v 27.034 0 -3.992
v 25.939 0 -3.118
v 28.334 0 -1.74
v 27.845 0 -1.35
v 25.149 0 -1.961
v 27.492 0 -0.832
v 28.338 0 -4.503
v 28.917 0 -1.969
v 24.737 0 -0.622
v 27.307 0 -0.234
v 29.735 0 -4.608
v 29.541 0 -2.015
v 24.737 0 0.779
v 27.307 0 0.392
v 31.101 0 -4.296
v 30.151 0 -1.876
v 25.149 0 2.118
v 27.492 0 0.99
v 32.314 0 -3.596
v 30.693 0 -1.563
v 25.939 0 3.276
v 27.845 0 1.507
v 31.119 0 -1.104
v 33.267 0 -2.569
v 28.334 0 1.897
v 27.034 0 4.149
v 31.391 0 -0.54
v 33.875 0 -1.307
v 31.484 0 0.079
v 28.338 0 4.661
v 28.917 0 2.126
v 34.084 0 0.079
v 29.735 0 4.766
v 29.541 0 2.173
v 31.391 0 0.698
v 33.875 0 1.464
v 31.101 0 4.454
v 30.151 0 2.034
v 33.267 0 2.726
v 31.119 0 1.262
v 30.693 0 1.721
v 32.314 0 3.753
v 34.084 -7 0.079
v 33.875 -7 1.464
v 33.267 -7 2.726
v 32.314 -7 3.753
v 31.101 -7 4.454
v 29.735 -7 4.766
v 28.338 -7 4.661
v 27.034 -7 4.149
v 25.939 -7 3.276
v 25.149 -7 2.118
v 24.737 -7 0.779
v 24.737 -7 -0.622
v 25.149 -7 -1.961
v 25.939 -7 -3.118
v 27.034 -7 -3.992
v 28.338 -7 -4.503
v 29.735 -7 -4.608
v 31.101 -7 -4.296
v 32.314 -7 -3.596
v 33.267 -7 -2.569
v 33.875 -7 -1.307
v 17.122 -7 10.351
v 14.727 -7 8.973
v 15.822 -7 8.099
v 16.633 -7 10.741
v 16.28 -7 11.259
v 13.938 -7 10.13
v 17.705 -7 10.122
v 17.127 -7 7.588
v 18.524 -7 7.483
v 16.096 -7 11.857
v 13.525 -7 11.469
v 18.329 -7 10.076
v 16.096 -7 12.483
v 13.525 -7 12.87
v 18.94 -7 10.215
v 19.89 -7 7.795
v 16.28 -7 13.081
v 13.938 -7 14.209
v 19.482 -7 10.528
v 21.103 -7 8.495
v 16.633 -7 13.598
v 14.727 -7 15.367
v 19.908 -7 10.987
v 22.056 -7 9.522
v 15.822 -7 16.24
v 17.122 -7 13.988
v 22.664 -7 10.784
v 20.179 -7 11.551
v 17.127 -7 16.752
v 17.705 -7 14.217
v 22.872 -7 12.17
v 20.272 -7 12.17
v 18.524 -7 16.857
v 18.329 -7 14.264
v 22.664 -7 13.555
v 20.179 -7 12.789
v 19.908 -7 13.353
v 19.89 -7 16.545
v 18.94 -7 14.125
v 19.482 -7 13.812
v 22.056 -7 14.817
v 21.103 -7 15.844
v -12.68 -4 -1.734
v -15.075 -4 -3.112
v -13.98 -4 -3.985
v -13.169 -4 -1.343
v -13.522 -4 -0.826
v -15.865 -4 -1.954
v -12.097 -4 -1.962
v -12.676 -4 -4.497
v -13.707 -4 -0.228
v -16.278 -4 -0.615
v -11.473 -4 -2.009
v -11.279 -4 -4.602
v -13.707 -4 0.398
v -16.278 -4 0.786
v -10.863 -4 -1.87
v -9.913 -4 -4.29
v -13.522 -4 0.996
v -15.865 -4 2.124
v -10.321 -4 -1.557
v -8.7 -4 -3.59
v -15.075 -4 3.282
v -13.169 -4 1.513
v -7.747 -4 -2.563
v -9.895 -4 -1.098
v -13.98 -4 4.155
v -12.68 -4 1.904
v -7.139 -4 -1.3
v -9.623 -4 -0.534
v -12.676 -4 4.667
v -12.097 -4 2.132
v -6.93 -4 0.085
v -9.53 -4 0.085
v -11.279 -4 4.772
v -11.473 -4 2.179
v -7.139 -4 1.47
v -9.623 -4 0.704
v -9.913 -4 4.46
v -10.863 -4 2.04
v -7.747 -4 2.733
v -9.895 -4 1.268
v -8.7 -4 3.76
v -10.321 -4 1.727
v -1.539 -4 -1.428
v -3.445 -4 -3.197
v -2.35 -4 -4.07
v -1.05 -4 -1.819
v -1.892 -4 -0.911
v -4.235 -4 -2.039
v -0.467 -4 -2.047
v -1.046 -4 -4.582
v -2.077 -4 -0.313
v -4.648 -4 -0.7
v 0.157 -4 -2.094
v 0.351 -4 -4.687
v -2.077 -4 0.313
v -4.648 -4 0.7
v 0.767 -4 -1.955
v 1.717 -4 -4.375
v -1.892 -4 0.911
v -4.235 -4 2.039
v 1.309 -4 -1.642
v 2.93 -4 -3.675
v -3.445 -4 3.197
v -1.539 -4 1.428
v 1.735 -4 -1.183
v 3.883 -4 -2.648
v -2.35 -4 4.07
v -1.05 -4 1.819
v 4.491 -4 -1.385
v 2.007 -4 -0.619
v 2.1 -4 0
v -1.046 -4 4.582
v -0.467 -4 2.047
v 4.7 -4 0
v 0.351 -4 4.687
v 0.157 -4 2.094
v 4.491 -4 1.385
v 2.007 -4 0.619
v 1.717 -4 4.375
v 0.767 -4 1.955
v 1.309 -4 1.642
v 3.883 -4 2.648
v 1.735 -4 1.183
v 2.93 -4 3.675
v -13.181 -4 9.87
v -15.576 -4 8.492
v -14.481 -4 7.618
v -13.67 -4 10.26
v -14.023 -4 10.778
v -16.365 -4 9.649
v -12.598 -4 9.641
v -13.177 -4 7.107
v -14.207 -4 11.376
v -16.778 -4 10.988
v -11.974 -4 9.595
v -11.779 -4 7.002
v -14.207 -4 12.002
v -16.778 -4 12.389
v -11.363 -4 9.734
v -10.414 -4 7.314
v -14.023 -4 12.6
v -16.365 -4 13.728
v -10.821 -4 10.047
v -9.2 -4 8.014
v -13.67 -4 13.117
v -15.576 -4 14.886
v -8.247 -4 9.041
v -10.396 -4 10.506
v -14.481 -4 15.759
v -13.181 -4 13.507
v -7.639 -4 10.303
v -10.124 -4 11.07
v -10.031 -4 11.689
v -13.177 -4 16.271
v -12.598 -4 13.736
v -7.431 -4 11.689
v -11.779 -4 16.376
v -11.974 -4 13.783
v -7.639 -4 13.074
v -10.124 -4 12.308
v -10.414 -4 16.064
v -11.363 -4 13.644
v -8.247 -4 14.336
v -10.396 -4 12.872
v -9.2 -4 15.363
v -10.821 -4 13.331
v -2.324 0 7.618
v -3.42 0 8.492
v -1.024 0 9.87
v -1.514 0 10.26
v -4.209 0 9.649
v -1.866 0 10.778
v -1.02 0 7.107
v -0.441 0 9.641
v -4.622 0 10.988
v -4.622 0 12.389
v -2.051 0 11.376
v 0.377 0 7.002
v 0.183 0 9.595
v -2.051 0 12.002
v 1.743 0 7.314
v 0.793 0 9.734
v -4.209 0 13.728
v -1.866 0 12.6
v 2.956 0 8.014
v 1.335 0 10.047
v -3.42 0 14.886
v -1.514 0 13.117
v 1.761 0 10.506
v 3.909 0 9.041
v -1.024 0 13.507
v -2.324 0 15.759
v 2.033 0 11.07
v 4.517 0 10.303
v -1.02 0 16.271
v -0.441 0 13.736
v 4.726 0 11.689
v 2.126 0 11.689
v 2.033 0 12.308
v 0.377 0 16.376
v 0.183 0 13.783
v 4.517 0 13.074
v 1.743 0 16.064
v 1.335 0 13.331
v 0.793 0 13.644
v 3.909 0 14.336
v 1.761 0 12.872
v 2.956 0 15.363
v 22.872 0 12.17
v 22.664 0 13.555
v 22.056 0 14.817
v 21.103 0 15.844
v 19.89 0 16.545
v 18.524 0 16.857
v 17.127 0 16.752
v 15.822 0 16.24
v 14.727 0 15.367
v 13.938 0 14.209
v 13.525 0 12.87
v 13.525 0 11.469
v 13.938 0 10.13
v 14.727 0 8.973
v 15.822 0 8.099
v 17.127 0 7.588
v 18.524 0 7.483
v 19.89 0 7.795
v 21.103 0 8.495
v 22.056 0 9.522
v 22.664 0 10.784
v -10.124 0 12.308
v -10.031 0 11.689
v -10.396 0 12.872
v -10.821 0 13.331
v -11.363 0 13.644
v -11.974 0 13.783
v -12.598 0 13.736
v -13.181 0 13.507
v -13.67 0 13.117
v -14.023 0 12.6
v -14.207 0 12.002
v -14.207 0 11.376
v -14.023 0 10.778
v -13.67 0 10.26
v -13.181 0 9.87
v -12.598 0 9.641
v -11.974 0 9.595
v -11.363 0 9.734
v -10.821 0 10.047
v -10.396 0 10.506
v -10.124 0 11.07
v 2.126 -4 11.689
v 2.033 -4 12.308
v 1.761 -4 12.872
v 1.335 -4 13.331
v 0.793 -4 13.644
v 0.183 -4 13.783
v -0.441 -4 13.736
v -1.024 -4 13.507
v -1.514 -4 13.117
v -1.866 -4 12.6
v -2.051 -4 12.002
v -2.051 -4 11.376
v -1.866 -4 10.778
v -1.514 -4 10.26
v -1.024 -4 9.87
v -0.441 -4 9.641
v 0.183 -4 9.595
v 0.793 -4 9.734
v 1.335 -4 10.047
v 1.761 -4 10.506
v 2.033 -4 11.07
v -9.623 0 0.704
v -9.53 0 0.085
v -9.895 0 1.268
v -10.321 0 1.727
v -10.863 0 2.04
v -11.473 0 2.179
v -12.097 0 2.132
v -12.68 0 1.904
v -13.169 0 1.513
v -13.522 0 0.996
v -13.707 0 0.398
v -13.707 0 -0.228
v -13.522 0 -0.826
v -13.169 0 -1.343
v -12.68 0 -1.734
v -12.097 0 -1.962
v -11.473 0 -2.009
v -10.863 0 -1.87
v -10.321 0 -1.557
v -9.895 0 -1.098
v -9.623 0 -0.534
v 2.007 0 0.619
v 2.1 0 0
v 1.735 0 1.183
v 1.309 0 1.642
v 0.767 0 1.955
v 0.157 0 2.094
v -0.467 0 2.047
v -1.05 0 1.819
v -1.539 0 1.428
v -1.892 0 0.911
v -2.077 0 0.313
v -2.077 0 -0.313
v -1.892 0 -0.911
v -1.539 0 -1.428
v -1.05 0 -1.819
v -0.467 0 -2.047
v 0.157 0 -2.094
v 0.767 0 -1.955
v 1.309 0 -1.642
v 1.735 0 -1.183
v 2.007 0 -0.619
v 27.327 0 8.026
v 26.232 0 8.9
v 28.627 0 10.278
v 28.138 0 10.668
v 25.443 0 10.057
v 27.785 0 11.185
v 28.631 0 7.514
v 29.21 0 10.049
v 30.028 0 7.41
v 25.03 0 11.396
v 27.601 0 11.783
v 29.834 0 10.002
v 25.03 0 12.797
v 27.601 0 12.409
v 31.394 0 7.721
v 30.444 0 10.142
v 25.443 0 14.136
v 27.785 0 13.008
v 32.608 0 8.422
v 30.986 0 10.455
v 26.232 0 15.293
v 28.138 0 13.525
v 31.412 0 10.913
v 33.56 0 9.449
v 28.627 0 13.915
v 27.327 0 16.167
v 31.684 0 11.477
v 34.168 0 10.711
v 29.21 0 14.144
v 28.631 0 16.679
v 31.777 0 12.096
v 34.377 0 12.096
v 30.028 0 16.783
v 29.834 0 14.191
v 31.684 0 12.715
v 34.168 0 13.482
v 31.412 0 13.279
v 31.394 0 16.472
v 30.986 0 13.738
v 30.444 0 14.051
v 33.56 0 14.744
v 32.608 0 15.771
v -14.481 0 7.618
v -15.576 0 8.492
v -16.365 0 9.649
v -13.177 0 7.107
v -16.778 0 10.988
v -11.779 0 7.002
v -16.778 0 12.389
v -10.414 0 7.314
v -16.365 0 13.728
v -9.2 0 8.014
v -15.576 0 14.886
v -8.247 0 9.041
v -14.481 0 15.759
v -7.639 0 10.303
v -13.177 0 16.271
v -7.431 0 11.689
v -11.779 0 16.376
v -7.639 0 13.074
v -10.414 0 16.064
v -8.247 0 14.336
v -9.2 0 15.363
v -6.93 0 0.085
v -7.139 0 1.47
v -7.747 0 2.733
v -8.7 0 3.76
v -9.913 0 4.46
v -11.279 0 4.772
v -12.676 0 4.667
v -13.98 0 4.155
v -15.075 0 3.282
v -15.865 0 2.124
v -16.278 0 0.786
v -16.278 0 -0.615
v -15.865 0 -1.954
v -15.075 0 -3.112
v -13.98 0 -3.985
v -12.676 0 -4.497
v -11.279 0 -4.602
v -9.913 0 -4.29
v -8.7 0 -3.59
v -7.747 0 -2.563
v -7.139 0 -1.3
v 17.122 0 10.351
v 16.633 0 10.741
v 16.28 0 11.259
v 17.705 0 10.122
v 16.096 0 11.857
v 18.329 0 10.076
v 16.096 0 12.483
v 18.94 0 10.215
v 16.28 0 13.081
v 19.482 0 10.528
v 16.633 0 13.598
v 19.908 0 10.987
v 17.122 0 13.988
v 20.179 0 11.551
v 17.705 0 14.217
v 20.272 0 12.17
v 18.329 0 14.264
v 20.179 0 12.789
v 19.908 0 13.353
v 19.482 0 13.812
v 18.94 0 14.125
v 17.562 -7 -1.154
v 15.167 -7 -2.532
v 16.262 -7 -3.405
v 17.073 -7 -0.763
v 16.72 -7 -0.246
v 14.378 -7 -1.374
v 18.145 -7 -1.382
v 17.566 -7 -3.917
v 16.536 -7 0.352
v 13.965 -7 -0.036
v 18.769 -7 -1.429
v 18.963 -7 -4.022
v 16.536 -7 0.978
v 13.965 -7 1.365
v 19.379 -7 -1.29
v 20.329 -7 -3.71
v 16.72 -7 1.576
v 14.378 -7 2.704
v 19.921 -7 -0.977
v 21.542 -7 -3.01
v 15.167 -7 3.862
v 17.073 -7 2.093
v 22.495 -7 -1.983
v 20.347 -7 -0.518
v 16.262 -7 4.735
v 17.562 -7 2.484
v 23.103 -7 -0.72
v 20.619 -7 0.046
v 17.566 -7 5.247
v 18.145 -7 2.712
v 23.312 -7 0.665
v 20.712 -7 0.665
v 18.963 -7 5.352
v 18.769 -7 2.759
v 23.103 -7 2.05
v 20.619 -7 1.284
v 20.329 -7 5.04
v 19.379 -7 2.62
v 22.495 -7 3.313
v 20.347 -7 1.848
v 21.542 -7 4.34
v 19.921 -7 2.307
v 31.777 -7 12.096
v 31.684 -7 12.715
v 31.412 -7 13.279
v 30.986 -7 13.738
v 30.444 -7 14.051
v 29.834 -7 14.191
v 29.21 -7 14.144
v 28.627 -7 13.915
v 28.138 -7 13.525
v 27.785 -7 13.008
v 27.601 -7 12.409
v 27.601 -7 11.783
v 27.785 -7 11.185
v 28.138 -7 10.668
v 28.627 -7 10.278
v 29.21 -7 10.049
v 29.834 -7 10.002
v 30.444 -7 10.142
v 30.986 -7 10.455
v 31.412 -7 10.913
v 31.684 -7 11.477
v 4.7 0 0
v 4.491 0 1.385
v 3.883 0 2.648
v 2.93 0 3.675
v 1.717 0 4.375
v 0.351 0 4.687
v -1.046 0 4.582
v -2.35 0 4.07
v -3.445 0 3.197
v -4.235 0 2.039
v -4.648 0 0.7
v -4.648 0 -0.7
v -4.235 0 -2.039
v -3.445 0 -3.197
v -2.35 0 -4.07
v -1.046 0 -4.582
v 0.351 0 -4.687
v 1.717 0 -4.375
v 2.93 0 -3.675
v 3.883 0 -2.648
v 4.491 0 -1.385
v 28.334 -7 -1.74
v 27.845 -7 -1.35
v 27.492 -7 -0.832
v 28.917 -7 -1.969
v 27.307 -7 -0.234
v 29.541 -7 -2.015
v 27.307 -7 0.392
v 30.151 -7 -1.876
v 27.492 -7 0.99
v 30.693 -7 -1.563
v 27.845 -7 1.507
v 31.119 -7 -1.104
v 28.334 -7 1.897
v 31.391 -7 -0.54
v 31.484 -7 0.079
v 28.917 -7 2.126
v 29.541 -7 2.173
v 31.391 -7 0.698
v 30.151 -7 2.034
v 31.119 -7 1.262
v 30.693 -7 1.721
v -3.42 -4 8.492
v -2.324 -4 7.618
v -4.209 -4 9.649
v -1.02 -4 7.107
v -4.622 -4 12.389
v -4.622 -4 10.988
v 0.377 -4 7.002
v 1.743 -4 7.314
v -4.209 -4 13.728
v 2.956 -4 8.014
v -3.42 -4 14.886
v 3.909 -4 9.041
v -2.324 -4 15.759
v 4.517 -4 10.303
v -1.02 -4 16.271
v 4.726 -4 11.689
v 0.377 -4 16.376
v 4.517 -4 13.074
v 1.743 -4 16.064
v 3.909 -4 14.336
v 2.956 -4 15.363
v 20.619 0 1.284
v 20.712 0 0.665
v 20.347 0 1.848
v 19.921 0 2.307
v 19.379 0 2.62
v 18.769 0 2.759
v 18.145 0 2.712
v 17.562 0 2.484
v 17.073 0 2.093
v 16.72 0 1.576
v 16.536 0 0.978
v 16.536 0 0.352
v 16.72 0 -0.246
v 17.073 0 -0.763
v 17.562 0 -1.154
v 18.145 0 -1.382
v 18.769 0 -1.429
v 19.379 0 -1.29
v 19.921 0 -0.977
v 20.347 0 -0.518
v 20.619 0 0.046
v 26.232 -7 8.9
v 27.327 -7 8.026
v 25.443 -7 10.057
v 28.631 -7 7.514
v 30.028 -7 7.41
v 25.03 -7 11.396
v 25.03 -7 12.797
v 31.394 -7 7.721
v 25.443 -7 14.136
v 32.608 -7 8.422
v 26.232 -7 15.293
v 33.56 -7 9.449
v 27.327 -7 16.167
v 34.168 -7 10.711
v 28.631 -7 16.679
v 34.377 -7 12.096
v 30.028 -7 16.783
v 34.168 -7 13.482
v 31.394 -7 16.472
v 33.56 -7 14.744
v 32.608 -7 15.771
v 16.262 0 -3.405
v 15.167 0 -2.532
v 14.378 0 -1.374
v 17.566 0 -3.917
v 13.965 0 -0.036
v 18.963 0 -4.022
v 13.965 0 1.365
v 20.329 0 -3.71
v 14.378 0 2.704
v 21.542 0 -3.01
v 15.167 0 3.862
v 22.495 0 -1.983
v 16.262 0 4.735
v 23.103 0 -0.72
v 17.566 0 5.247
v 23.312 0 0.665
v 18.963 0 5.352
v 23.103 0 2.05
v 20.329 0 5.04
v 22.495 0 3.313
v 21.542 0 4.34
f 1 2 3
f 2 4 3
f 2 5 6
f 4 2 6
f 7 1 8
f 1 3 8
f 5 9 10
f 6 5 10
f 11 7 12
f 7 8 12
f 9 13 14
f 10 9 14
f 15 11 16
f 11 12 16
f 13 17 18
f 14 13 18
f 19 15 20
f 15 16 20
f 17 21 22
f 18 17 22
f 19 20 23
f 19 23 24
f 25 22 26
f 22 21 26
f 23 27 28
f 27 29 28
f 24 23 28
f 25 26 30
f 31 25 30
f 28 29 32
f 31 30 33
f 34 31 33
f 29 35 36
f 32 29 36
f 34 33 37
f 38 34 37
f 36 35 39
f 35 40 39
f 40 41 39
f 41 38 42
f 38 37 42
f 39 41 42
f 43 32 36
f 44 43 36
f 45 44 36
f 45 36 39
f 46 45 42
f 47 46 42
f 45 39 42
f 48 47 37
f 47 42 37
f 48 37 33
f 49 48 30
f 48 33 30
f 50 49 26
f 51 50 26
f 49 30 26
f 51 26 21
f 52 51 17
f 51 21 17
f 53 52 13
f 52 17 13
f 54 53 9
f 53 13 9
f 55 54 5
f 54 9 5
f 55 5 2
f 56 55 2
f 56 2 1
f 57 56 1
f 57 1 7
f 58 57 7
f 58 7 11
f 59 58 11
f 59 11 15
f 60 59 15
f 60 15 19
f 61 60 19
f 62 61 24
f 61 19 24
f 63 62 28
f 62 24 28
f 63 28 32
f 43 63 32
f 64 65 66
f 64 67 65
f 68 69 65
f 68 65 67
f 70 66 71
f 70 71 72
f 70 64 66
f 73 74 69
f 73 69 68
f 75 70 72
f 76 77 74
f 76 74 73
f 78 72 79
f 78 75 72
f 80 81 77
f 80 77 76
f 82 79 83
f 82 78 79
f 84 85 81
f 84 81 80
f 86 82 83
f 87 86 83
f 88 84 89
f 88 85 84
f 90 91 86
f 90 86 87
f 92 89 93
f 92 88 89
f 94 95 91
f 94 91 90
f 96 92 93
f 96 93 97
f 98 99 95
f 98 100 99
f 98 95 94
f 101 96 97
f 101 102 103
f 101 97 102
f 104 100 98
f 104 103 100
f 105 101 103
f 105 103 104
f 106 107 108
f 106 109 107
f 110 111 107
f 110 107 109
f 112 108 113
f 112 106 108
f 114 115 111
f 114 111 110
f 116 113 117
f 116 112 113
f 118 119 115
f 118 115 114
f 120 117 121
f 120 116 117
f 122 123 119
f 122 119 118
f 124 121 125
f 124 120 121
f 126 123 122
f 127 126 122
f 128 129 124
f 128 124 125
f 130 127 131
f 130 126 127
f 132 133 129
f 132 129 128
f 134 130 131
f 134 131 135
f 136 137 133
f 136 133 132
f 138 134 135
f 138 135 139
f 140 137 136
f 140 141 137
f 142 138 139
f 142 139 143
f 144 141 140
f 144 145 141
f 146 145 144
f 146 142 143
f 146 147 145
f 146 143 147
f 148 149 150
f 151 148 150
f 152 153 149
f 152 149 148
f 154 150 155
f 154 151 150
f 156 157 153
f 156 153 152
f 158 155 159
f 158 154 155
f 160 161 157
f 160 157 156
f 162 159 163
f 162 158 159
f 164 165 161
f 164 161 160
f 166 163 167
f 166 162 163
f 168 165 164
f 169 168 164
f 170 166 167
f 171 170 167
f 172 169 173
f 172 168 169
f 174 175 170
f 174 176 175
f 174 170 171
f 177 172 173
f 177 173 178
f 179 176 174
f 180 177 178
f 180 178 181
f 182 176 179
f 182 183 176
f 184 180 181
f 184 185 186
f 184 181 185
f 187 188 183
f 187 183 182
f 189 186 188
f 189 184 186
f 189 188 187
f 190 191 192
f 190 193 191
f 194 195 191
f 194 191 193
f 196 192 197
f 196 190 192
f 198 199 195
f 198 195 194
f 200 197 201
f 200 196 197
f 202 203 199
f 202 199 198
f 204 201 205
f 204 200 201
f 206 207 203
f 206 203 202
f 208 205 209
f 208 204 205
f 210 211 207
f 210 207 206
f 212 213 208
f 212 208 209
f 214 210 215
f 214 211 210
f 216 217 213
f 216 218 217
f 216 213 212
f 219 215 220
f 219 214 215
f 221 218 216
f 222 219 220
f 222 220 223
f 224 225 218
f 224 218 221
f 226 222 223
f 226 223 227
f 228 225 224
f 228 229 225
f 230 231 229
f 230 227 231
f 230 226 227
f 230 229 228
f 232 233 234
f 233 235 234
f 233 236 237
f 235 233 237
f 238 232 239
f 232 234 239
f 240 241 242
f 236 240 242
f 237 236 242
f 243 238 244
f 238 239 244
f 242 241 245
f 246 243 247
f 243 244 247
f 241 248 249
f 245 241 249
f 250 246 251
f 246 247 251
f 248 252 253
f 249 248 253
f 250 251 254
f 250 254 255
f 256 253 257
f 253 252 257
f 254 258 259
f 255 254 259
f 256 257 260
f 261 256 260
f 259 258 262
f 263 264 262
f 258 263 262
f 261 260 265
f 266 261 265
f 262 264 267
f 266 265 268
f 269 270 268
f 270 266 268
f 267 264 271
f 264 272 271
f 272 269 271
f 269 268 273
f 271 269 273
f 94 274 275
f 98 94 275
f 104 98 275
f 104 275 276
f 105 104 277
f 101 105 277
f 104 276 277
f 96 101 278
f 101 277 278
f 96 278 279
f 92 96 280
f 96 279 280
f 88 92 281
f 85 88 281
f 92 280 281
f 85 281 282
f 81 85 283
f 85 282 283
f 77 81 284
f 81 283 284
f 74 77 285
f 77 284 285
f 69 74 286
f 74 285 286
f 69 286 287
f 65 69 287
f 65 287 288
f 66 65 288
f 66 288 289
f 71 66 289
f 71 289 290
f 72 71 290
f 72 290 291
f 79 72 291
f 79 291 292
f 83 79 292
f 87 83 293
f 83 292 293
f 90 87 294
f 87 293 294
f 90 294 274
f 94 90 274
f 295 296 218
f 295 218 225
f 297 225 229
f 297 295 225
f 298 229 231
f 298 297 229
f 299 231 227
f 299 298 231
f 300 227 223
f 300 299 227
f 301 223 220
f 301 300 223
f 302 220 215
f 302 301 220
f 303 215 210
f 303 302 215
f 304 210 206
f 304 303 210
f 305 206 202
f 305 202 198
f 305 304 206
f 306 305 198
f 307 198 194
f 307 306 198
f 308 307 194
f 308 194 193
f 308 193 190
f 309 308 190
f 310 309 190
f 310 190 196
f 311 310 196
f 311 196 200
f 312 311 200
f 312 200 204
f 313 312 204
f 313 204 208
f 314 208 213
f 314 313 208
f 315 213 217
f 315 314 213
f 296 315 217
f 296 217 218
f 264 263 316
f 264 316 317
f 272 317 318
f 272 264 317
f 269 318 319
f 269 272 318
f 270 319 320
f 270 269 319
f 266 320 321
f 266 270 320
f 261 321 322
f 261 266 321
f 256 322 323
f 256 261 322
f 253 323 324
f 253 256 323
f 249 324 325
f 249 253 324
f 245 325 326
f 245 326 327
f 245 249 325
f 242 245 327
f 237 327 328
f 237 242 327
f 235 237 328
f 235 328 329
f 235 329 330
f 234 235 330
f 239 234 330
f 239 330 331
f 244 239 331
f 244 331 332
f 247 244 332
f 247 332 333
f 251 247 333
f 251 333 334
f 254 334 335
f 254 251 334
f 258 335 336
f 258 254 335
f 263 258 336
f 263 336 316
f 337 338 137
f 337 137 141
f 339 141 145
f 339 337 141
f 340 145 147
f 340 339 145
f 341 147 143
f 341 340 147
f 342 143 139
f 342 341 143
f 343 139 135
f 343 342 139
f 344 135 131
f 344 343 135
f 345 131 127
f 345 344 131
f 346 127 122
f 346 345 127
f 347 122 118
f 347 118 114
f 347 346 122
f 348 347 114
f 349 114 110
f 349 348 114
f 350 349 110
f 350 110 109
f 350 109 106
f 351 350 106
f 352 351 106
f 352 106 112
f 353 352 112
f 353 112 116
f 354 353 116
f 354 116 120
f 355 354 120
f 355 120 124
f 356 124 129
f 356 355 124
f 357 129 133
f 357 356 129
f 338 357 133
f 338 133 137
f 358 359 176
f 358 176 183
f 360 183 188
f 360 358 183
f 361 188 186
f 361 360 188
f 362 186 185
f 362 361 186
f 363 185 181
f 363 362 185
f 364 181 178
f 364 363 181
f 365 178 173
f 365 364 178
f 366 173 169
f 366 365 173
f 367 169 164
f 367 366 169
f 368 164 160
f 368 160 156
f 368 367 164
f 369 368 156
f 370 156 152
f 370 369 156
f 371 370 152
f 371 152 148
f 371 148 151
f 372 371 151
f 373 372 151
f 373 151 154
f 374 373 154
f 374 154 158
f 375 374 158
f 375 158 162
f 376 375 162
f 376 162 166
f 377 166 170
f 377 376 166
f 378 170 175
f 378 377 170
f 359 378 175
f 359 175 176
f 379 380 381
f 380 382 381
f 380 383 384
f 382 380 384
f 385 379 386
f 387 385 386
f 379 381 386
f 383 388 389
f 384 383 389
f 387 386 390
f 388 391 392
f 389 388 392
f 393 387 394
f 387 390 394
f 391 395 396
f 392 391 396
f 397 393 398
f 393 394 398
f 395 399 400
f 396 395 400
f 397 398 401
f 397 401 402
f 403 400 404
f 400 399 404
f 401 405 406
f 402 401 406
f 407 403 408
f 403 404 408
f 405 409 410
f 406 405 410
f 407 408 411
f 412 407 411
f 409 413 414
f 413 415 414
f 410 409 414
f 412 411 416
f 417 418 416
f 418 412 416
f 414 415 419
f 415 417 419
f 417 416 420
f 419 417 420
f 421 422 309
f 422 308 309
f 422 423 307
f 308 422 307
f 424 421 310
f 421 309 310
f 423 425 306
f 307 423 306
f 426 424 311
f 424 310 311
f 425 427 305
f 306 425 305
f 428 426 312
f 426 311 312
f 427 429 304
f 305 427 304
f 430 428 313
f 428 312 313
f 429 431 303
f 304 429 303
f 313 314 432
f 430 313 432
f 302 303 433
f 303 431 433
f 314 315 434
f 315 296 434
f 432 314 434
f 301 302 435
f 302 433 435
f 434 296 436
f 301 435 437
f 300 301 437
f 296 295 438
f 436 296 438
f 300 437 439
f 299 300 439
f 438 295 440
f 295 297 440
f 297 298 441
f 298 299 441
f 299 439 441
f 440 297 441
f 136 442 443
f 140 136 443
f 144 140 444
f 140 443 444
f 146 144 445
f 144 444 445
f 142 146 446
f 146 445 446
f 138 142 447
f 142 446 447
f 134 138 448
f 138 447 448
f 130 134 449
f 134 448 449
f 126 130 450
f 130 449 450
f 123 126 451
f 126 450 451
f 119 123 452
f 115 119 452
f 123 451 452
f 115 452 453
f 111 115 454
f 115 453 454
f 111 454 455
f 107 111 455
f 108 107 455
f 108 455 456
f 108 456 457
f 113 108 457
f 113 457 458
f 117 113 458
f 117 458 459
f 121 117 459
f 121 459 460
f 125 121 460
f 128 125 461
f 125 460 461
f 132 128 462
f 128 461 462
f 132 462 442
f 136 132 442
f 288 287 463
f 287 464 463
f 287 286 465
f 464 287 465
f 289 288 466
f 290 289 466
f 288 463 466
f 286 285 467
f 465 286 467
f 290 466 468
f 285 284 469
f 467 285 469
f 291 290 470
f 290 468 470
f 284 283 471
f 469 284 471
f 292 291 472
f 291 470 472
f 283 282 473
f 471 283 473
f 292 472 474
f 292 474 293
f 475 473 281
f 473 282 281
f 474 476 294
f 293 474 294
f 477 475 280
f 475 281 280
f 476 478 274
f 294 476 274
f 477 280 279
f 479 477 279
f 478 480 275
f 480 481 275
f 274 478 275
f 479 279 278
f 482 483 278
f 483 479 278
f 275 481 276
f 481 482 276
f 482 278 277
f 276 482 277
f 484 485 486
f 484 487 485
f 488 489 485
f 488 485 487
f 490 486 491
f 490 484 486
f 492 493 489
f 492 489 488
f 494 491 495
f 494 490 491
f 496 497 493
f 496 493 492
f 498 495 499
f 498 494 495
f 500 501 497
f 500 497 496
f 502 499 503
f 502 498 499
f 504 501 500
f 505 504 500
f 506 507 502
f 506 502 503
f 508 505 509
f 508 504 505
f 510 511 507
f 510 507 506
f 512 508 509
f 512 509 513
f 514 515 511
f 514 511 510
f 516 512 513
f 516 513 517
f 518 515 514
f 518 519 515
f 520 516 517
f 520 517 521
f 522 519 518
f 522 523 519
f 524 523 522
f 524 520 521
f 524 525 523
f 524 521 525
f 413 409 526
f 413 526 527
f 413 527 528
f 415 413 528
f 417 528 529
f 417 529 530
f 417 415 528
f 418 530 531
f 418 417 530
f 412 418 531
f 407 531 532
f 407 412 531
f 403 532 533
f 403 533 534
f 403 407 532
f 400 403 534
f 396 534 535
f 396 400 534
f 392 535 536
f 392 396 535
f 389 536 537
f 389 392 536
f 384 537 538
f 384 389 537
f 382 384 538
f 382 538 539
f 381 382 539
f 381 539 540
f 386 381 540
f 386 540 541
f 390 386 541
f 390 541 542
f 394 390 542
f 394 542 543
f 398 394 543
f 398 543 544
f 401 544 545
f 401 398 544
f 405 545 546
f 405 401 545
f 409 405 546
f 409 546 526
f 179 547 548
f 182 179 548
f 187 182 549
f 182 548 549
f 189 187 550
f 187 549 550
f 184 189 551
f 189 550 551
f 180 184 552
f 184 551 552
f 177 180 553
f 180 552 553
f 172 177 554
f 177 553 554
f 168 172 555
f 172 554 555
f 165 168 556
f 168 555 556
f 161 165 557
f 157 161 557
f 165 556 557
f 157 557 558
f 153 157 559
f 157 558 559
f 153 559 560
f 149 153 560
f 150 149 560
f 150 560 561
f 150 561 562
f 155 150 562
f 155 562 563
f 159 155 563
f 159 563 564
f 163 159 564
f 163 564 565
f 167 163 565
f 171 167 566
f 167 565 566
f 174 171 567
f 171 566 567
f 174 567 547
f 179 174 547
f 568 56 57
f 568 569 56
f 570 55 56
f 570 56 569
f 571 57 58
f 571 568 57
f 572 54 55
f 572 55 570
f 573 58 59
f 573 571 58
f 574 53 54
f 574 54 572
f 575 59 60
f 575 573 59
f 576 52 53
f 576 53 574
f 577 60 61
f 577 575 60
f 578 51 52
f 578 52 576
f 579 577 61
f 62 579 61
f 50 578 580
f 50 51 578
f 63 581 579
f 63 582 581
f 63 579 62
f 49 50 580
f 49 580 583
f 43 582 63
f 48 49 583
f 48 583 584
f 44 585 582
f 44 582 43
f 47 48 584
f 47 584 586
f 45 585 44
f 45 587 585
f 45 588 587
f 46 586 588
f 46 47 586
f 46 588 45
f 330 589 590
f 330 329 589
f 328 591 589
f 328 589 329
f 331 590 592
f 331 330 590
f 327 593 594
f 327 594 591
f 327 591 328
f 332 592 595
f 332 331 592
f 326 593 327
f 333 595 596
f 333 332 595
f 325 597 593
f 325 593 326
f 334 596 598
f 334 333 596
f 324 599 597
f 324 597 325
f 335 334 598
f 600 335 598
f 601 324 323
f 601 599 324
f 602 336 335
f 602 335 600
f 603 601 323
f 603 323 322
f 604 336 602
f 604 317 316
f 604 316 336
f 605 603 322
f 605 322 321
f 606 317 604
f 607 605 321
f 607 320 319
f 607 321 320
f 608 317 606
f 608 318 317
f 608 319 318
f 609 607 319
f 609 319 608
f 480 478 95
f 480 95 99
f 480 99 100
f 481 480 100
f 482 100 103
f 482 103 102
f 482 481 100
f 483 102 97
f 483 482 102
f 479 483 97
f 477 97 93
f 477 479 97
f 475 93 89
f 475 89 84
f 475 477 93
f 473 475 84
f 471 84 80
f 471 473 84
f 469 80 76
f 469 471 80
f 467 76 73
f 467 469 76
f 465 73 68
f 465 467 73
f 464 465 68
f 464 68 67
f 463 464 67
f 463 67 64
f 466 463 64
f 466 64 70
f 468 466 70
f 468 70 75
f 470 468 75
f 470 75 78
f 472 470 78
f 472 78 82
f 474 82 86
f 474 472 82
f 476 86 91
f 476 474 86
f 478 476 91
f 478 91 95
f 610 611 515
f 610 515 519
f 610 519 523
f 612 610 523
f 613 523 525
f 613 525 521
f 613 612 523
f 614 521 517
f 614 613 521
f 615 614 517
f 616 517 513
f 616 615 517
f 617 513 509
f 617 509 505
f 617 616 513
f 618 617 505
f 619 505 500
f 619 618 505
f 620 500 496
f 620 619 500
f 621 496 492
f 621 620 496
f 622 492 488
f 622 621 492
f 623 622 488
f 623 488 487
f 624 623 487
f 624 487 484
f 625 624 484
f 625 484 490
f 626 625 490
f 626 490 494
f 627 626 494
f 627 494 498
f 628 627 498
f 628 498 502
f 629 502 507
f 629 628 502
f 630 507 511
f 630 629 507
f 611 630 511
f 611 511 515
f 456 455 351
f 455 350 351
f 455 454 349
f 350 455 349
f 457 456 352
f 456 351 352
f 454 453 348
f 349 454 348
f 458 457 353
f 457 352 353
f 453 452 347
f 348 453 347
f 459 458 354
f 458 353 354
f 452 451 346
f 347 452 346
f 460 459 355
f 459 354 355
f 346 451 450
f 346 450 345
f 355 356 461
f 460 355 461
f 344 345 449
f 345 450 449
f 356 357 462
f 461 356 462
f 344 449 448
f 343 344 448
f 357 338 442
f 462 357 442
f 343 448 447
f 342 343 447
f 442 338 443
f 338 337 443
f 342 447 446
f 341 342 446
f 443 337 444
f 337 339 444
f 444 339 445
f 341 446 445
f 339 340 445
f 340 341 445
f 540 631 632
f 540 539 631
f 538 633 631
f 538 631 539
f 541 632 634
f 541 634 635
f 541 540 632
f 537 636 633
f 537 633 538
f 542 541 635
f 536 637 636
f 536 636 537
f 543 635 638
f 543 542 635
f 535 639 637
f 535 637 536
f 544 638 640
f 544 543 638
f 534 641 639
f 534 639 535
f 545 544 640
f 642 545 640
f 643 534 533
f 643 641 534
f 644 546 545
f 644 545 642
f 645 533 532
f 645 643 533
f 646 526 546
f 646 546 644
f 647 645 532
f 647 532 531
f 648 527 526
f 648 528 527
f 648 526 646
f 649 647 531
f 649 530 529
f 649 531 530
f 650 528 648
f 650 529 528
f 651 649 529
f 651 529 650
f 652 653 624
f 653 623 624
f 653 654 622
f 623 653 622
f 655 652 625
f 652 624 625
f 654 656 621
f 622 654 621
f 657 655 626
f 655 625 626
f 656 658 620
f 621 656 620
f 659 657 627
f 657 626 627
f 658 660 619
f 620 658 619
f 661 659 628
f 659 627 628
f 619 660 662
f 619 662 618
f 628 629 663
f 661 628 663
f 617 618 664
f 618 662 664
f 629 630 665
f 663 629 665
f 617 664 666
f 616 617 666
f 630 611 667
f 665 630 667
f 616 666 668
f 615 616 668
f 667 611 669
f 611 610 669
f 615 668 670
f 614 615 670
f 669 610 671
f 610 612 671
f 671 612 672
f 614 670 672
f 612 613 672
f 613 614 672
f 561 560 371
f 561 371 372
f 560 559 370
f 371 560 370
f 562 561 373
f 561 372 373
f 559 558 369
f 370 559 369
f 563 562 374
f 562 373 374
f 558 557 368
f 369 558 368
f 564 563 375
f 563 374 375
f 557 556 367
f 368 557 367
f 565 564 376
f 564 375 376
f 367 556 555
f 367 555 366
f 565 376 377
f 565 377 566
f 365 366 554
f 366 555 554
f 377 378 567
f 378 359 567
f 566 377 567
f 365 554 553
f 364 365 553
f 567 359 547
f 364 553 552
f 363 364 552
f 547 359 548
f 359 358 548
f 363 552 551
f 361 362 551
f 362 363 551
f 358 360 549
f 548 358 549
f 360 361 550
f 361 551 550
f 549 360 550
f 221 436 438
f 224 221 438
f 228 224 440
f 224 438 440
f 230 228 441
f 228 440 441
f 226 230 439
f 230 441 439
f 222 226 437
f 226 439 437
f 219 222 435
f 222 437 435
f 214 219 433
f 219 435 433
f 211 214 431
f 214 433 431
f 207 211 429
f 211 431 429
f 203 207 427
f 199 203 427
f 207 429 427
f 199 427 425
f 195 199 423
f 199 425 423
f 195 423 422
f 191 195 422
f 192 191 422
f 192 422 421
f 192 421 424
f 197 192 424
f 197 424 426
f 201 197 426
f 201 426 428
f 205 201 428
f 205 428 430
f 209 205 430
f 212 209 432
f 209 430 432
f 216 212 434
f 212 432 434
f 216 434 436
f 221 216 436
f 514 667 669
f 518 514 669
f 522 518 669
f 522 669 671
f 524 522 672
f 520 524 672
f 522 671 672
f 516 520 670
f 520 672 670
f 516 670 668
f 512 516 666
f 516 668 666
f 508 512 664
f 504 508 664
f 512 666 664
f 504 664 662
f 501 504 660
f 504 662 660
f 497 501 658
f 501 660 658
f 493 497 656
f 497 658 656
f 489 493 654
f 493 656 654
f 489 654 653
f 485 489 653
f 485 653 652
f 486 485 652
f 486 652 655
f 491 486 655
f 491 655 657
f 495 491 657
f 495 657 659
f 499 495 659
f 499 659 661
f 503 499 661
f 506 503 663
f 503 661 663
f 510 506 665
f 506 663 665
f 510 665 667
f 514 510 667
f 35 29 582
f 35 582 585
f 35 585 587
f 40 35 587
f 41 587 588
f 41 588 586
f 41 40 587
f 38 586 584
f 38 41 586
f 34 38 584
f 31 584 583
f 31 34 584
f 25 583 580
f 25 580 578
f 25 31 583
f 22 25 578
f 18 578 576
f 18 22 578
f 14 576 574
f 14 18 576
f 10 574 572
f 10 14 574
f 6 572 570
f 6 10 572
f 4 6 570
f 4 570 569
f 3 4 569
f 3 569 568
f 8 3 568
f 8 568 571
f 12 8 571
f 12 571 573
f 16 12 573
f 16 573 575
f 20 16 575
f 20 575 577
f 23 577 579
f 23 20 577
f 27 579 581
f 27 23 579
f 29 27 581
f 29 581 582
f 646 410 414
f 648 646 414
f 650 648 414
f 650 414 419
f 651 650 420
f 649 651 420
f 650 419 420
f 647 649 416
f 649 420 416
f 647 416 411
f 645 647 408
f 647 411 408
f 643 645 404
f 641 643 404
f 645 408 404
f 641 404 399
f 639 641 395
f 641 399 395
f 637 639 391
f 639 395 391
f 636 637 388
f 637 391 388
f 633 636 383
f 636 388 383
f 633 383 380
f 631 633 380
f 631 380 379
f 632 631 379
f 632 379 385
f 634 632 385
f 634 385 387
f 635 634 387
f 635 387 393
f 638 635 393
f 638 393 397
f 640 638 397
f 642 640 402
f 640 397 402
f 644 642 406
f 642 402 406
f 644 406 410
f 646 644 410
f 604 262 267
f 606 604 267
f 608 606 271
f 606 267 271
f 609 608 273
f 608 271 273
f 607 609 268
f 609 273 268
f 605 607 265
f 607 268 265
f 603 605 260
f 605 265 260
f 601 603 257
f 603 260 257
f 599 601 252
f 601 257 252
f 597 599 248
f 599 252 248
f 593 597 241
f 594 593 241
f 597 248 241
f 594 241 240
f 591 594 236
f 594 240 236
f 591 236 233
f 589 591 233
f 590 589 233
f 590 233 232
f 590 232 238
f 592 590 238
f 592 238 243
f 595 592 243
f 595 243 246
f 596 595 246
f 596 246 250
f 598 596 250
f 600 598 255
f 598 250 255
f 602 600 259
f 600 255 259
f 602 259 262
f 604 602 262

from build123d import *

# Parameters (mm, degrees)
F0_R     = 4.7
F0_R_2   = 2.1
F1_DEPTH = 7
F2_DEPTH = 4


with BuildPart() as f1:
    # F0 (on Front) → F1 (new body)
    with BuildSketch(Plane.XZ):
        with Locations((18.172415, 12.16969)):
            Circle(F0_R)
        with Locations((18.172415, 12.16969)):
            Circle(F0_R_2, mode=Mode.SUBTRACT)
        with Locations((29.677156, 12.096411)):
            Circle(F0_R)
        with Locations((29.677156, 12.096411)):
            Circle(F0_R_2, mode=Mode.SUBTRACT)
        with Locations((29.384041, 0.078719)):
            Circle(F0_R)
        with Locations((29.384041, 0.078719)):
            Circle(F0_R_2, mode=Mode.SUBTRACT)
        with Locations((18.612085, 0.664948)):
            Circle(F0_R)
        with Locations((18.612085, 0.664948)):
            Circle(F0_R_2, mode=Mode.SUBTRACT)
    extrude(amount=F1_DEPTH)


with BuildPart() as f2:
    # F0 (on Front) → F2 (new body)
    with BuildSketch(Plane.XZ):
        with Locations((-12.130689, 11.688724)):
            Circle(F0_R)
        with Locations((-12.130689, 11.688724)):
            Circle(F0_R_2, mode=Mode.SUBTRACT)
        with Locations((0.025822, 11.688724)):
            Circle(F0_R)
        with Locations((0.025822, 11.688724)):
            Circle(F0_R_2, mode=Mode.SUBTRACT)
        Circle(F0_R)
        Circle(F0_R_2, mode=Mode.SUBTRACT)
        with Locations((-11.63006, 0.085095)):
            Circle(F0_R)
        with Locations((-11.63006, 0.085095)):
            Circle(F0_R_2, mode=Mode.SUBTRACT)
    extrude(amount=F2_DEPTH)


solid = Compound([f1.part, f2.part])
